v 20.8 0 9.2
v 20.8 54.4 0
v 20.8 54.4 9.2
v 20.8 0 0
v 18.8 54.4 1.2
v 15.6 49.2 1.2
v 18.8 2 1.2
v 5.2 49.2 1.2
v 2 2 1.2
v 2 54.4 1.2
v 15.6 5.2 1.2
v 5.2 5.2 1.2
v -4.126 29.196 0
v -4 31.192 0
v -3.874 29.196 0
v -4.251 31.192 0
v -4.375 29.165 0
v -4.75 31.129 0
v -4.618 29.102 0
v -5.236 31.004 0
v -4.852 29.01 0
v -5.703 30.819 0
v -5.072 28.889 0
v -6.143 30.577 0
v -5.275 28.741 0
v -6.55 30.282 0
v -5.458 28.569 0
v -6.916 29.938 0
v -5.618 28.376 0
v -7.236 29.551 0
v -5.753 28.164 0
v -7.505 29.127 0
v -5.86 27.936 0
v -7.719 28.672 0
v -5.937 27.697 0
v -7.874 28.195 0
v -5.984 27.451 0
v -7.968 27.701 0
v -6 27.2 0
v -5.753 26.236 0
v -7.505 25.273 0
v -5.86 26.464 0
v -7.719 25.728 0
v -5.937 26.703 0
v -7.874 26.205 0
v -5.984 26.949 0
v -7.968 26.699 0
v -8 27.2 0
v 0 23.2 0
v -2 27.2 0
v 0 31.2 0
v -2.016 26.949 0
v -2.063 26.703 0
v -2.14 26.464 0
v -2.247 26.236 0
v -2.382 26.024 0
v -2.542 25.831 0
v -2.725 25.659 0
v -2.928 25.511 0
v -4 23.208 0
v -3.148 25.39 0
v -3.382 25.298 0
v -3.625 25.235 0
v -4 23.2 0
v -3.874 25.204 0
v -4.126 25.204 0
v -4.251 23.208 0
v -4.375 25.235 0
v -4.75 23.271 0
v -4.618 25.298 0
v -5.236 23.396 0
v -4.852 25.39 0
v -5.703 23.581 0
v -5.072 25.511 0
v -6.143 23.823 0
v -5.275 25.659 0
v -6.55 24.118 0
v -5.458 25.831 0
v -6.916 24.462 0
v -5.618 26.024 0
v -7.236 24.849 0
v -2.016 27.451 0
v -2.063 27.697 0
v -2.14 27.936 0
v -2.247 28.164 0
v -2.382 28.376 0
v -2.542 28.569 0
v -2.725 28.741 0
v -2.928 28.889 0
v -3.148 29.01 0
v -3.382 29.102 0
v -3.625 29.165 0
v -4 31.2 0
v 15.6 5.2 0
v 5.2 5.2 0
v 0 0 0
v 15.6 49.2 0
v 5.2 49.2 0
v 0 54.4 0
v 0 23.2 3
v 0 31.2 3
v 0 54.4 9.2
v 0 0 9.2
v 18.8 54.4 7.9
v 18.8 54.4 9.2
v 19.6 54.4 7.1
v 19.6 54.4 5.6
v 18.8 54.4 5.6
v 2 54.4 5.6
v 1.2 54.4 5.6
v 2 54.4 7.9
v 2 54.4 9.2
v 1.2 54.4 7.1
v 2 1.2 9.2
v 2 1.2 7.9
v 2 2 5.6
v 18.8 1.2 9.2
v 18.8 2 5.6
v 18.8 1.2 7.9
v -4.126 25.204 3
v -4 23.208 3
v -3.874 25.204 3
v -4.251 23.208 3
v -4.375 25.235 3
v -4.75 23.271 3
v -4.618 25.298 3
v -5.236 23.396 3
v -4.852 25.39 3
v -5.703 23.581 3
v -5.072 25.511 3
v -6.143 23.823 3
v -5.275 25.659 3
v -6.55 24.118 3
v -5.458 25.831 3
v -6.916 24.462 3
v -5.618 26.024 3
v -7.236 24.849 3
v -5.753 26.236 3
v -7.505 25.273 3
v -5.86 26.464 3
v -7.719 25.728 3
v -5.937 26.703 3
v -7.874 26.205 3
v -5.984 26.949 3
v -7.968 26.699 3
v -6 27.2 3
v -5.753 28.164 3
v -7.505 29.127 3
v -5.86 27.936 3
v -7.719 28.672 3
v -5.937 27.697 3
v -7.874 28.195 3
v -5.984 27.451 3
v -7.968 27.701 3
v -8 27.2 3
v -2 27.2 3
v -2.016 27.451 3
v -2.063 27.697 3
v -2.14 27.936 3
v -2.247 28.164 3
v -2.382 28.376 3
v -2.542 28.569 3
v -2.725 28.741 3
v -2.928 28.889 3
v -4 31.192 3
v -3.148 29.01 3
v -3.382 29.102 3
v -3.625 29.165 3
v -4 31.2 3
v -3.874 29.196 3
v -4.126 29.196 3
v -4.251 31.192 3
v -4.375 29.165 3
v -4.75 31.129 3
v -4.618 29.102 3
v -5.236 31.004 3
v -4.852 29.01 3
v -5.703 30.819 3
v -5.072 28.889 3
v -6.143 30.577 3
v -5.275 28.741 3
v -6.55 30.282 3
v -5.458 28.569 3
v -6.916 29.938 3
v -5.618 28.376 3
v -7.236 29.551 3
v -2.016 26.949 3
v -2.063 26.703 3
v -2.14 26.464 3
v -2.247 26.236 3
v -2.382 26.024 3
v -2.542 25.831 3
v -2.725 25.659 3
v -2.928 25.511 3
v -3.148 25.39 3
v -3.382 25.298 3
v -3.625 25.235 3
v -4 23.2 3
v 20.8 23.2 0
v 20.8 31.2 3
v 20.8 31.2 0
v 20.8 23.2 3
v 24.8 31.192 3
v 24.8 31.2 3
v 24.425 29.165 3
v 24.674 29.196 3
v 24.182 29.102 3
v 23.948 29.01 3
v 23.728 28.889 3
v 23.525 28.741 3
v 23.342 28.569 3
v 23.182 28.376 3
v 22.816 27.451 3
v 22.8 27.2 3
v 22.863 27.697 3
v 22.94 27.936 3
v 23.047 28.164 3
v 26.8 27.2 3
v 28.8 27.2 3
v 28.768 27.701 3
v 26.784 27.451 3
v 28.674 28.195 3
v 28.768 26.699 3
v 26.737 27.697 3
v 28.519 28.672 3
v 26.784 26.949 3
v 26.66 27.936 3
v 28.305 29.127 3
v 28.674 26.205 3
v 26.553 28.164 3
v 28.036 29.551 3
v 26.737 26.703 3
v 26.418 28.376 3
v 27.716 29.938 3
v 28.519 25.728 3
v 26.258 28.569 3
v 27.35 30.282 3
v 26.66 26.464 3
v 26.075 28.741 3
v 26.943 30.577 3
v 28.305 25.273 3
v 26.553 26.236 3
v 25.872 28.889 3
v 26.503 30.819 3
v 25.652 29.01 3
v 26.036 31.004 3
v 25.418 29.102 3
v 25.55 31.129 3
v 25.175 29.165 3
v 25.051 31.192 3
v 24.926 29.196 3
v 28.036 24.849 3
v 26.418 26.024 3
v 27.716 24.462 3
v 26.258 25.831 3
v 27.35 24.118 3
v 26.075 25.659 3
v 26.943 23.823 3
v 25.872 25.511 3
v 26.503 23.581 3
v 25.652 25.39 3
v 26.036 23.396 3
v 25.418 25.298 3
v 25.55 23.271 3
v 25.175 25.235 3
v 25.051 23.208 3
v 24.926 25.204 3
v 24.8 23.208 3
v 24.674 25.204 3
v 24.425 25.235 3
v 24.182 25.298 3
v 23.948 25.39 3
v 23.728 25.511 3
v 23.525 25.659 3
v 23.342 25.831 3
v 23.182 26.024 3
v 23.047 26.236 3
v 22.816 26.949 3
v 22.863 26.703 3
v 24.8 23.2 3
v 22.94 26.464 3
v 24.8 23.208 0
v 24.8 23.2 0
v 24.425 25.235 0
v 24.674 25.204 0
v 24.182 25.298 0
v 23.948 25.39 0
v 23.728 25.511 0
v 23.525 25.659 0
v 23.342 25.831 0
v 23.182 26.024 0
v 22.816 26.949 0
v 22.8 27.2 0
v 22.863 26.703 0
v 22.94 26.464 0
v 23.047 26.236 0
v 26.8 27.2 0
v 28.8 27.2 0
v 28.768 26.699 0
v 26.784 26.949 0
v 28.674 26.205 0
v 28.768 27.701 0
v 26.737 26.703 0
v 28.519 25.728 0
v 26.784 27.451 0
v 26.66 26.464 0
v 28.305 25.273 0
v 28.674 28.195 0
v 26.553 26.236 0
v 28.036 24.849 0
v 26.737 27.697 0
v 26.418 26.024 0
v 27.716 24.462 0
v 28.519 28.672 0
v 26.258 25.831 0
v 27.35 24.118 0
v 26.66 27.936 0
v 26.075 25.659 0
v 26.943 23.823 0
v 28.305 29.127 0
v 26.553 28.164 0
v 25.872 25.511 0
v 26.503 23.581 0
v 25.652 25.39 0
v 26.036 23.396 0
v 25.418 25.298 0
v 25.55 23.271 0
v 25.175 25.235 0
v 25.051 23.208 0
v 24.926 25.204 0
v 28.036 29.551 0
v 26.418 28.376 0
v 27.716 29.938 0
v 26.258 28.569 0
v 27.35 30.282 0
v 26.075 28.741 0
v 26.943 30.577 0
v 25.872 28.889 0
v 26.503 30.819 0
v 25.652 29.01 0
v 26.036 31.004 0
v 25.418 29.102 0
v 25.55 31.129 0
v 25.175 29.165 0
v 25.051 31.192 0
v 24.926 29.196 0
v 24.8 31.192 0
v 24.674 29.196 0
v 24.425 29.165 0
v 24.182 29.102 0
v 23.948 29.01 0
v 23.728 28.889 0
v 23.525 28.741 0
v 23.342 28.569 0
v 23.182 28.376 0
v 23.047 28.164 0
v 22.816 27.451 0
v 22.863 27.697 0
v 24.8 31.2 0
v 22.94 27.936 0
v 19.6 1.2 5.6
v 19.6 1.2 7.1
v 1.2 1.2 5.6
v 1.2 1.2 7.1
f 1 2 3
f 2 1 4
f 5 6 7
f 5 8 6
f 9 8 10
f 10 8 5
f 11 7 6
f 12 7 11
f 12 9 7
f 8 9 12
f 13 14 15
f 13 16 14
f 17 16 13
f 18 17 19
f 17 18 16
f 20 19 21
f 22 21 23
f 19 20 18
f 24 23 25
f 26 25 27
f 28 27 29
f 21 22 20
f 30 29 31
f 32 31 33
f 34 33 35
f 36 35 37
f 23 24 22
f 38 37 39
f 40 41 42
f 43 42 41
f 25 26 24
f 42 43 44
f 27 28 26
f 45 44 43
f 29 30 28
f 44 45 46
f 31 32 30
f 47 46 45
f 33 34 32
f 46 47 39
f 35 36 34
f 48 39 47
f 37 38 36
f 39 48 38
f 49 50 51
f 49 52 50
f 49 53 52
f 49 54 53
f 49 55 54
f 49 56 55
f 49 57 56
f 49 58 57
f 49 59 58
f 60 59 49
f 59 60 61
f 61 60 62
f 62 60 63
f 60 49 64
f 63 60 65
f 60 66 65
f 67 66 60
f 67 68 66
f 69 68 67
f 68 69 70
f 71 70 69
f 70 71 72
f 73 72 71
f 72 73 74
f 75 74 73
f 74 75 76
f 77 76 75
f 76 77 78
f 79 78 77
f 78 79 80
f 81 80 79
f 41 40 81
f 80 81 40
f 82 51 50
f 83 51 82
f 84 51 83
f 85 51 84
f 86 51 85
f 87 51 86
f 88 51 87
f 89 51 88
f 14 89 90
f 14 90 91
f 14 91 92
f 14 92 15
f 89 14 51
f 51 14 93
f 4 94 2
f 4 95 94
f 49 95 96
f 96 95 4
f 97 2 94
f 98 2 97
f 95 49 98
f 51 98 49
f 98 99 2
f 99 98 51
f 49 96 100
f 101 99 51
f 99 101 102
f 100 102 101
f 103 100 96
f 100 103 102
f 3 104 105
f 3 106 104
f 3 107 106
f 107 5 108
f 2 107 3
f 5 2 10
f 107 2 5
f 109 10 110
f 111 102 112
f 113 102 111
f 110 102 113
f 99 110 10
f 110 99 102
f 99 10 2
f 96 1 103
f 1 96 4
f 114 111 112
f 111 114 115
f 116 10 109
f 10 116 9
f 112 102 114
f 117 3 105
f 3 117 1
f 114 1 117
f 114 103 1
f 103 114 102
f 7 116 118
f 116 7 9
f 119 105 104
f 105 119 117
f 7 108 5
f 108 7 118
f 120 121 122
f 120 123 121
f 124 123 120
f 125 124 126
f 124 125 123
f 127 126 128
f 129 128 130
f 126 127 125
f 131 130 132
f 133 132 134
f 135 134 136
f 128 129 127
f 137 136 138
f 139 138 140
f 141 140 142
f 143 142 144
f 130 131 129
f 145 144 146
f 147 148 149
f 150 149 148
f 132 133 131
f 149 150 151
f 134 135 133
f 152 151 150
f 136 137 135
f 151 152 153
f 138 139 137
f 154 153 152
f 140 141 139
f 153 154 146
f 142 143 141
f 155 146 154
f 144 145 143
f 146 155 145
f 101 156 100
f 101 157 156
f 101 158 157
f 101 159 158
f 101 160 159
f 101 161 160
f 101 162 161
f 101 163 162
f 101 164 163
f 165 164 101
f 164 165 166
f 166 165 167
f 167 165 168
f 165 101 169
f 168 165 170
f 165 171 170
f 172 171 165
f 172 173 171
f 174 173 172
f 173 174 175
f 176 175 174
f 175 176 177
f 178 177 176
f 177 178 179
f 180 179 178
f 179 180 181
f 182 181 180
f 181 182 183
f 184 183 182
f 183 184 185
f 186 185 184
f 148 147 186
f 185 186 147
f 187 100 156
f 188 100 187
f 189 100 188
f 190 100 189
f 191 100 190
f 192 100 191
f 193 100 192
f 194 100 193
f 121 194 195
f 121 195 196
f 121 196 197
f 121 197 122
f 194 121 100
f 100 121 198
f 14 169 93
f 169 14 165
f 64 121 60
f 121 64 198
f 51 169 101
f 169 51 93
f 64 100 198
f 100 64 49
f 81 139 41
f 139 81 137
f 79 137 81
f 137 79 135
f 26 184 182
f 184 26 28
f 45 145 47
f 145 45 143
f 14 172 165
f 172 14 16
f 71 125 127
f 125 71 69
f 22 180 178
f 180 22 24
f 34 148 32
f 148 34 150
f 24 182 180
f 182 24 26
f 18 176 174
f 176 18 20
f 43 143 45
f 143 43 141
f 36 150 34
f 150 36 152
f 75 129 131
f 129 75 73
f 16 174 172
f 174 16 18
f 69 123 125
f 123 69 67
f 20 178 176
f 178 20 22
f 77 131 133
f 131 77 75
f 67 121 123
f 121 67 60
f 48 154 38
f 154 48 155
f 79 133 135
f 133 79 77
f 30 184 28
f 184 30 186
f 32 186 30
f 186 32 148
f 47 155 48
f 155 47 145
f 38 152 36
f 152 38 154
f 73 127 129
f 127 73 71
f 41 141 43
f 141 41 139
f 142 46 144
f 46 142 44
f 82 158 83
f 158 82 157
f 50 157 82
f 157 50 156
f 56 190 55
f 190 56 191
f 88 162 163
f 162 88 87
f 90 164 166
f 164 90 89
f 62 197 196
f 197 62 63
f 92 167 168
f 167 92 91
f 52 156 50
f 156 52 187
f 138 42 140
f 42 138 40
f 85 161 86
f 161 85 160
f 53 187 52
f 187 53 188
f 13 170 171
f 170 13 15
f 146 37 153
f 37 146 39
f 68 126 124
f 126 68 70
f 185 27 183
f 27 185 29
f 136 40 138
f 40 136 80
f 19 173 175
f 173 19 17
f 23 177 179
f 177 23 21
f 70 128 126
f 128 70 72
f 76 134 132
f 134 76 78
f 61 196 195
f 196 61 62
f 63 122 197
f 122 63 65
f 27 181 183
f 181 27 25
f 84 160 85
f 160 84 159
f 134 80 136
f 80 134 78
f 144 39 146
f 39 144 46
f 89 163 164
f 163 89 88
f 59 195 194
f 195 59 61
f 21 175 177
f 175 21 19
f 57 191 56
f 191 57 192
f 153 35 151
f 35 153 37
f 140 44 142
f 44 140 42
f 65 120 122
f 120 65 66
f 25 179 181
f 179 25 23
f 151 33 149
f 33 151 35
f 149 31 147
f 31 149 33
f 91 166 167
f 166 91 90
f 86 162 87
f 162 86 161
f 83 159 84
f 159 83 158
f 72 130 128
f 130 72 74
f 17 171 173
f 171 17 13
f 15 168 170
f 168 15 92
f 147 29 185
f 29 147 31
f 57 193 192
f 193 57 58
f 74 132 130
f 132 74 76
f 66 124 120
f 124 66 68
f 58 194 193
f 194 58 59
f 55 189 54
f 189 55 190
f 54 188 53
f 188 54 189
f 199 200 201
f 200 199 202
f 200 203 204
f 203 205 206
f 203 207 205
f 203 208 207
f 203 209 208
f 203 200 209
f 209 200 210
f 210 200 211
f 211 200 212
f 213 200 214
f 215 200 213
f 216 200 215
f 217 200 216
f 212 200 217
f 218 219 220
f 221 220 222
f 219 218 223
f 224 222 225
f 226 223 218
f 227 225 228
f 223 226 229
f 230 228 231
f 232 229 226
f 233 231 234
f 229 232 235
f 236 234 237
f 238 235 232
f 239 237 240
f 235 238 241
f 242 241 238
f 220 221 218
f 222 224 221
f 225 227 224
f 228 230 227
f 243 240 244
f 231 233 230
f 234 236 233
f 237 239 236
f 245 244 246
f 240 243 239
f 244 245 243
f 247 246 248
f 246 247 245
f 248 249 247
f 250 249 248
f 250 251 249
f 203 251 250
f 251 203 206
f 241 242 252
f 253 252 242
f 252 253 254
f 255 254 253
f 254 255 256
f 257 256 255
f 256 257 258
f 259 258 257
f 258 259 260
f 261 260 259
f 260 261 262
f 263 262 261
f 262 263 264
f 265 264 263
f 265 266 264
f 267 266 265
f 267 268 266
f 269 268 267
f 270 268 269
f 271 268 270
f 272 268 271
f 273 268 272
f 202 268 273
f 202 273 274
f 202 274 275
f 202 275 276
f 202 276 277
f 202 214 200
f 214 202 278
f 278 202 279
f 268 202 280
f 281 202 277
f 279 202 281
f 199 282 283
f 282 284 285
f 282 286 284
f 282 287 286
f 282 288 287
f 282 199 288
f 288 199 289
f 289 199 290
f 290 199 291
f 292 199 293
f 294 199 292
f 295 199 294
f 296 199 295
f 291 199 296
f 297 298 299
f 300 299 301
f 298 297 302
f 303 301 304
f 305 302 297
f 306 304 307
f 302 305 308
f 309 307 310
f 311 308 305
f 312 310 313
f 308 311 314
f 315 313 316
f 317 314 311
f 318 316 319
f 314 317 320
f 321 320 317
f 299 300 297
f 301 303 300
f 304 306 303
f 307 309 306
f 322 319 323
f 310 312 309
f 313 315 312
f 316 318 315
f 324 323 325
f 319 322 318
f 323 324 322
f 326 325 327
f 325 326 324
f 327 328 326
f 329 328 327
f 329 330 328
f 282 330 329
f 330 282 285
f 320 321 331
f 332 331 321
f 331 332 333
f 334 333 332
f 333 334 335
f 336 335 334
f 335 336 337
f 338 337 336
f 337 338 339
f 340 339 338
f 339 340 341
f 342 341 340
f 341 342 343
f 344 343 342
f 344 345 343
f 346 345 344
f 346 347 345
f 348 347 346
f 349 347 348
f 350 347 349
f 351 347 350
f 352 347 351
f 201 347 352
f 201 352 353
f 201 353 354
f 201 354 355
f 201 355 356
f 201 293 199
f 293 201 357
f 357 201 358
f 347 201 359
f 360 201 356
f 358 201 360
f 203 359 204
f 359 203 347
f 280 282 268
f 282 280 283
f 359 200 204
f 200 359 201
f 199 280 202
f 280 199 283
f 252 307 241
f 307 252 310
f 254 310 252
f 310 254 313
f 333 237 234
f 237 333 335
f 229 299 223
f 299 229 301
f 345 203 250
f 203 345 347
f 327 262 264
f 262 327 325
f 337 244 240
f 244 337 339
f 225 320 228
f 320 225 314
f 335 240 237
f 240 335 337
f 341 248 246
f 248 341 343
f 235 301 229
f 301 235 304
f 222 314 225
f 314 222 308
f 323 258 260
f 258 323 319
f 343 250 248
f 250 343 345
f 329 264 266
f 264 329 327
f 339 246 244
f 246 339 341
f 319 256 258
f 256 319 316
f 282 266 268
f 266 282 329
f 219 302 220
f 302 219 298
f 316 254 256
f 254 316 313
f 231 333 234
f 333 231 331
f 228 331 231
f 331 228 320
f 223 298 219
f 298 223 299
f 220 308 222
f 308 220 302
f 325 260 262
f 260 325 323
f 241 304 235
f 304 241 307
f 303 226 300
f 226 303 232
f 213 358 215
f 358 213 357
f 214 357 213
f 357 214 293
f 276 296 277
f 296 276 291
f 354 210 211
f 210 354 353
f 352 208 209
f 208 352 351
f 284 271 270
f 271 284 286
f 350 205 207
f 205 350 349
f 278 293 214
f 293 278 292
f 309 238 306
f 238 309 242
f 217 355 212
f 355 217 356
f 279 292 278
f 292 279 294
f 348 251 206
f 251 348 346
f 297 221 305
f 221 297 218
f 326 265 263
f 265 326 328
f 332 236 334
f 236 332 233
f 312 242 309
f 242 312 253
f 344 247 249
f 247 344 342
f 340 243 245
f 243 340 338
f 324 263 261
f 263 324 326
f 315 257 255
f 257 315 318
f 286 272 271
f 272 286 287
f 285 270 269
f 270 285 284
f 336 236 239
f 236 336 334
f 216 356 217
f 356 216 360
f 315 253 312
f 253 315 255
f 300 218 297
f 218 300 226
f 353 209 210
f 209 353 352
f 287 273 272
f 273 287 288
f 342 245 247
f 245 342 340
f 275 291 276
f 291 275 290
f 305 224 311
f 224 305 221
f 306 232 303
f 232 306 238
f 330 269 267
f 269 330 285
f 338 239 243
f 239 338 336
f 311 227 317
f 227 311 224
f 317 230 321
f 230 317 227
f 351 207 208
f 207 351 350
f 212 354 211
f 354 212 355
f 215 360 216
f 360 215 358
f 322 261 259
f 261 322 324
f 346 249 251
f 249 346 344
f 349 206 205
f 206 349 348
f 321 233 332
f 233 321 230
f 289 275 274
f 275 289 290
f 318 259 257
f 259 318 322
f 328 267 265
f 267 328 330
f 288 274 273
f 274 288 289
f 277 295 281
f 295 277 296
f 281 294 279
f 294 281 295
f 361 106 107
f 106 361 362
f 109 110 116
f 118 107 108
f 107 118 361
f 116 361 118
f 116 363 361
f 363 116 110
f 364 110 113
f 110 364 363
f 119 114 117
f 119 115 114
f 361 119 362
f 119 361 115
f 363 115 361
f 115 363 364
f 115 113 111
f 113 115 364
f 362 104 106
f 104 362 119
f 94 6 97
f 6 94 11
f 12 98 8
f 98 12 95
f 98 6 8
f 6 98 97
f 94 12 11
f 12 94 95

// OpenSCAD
// file: ../lib/pcb_led_cvf.scad
// for led power module modified

/* bluetooth_mate_holder.scad
 * By John Biehler - November 17, 2011
 * http://www.thingiverse.com/thing:

 * derived from pcb_box_slide_with_tabs.scad
 * By Nicholas C Lewis - Jan 1, 2011
 * http://www.thingiverse.com/thing:5396
 *
 * derived from pcb_box_slide.scad
 *     Parametric, open PCB-box (slide-in) by chlunde
 *     http://www.thingiverse.com/thing:4071
 *
 * CHANGES
 * - adjusted to fit Arduino Mega
 * - added mounting tabs
 * - turned off cutouts
 * - adjusted bottom cutout size
 */

$fn=50;

module pcb_led_cvf(

	pcb_width = 48.2,
	pcb_length =24.1,
	pcb_height =1.1,
	slisse = 0.8,

	pcb_bottom_margin = 1,
	wall_width_thick = 2,
	box_height = 7,

	//tab parameters
	tab_hole_radius=2,
	tab_outer_radius=4,

	inner_margin = 4,

	add_tabs = true

) {
	wall_width = wall_width_thick-slisse;

module tab() {
	difference(){
		union() {
			translate([-tab_outer_radius,-tab_outer_radius,0])
			cube([tab_outer_radius,2*tab_outer_radius,wall_width_thick+1]);
			translate([-tab_outer_radius,0,0])
				cylinder(r=tab_outer_radius, h = wall_width_thick+1);
		}
		translate([-tab_outer_radius,0,0]) {
			cylinder(r= tab_hole_radius, h = wall_width_thick+5,center=true);
		}
	}

}

module box() {
	union() {
		cube([pcb_width + 2*wall_width, pcb_length + 2*wall_width, wall_width]);

		cube([wall_width_thick, pcb_length + 2*wall_width, box_height]);

		cube([pcb_width + 2*wall_width, wall_width_thick, box_height]);

		%translate([0, pcb_length+wall_width, 0])
			cube([pcb_width + 2*wall_width,wall_width,box_height]);

		translate([pcb_width + wall_width - slisse,0,0])
			cube([wall_width_thick, pcb_length + 2*wall_width, box_height]);
	}
	if(add_tabs) {
//comment out this part to remove tabs
		for(i=[(pcb_length + 2*wall_width)/2]){
	translate([0,i,0])tab();
	translate([pcb_width + 2*wall_width,i,0])mirror()tab();
		}
	}

}

module pcb() {
	translate([wall_width, wall_width, wall_width + pcb_bottom_margin])
		cube([pcb_width,pcb_length + wall_width + 0.1,pcb_height]);
	translate([wall_width, wall_width, wall_width + pcb_bottom_margin+pcb_height])rotate([0,45,0])
		cube([pcb_height,pcb_length + wall_width + 0.1,pcb_height]);
	translate([wall_width+pcb_width-2*cos(45)*pcb_height, wall_width, wall_width + pcb_bottom_margin+pcb_height])rotate([0,45,0])
		cube([pcb_height,pcb_length + wall_width + 0.1,pcb_height]);
	translate([wall_width_thick, wall_width, wall_width + pcb_bottom_margin])
		cube([pcb_width-2*slisse,pcb_length + wall_width + 0.1,box_height]);

}



module holes() {
		*translate([wall_width + pcb_width/2, wall_width_thick + 0.1, pcb_width/2+wall_width])
			rotate(a=90,v=[1,0,0])
				cylinder(r=pcb_width/2, h=wall_width_thick + 0.2);

		*translate([-0.1, wall_width + pcb_length/2, pcb_length/2 + wall_width])
			rotate(a=90,v=[0,1,0])
				cylinder(r=pcb_length/2, h=wall_width_thick + 0.2);

		*translate([pcb_width + wall_width - slisse - 0.1, wall_width + pcb_length/2, pcb_length/2 + wall_width])
			rotate(a=90,v=[0,1,0])
				cylinder(r=pcb_length/2, h=wall_width_thick + 0.2);

	 * translate([pcb_width/2 + wall_width, wall_width + pcb_length/2, -0.1])
			rotate(a=0,v=[0,1,0])
				cylinder(r=min(pcb_length,pcb_width)/2 - wall_width/2, h=wall_width_thick + 0.2);

		translate([inner_margin +wall_width, inner_margin+wall_width, -0.1])
			cube([pcb_width-inner_margin*2,pcb_length -inner_margin*2,wall_width + 0.2]);
}

	difference() {
		box();
		pcb();
		holes();
	}
}



pcb_led_cvf();
// main file
use <../lib/pcb_led_cvf.scad>

$fn = 50;

pcb_led_cvf(
  pcb_length=52,
  pcb_width=18.4,
  pcb_height=1.5,
  pcb_bottom_margin=4.4,
  box_height=9.2
);
